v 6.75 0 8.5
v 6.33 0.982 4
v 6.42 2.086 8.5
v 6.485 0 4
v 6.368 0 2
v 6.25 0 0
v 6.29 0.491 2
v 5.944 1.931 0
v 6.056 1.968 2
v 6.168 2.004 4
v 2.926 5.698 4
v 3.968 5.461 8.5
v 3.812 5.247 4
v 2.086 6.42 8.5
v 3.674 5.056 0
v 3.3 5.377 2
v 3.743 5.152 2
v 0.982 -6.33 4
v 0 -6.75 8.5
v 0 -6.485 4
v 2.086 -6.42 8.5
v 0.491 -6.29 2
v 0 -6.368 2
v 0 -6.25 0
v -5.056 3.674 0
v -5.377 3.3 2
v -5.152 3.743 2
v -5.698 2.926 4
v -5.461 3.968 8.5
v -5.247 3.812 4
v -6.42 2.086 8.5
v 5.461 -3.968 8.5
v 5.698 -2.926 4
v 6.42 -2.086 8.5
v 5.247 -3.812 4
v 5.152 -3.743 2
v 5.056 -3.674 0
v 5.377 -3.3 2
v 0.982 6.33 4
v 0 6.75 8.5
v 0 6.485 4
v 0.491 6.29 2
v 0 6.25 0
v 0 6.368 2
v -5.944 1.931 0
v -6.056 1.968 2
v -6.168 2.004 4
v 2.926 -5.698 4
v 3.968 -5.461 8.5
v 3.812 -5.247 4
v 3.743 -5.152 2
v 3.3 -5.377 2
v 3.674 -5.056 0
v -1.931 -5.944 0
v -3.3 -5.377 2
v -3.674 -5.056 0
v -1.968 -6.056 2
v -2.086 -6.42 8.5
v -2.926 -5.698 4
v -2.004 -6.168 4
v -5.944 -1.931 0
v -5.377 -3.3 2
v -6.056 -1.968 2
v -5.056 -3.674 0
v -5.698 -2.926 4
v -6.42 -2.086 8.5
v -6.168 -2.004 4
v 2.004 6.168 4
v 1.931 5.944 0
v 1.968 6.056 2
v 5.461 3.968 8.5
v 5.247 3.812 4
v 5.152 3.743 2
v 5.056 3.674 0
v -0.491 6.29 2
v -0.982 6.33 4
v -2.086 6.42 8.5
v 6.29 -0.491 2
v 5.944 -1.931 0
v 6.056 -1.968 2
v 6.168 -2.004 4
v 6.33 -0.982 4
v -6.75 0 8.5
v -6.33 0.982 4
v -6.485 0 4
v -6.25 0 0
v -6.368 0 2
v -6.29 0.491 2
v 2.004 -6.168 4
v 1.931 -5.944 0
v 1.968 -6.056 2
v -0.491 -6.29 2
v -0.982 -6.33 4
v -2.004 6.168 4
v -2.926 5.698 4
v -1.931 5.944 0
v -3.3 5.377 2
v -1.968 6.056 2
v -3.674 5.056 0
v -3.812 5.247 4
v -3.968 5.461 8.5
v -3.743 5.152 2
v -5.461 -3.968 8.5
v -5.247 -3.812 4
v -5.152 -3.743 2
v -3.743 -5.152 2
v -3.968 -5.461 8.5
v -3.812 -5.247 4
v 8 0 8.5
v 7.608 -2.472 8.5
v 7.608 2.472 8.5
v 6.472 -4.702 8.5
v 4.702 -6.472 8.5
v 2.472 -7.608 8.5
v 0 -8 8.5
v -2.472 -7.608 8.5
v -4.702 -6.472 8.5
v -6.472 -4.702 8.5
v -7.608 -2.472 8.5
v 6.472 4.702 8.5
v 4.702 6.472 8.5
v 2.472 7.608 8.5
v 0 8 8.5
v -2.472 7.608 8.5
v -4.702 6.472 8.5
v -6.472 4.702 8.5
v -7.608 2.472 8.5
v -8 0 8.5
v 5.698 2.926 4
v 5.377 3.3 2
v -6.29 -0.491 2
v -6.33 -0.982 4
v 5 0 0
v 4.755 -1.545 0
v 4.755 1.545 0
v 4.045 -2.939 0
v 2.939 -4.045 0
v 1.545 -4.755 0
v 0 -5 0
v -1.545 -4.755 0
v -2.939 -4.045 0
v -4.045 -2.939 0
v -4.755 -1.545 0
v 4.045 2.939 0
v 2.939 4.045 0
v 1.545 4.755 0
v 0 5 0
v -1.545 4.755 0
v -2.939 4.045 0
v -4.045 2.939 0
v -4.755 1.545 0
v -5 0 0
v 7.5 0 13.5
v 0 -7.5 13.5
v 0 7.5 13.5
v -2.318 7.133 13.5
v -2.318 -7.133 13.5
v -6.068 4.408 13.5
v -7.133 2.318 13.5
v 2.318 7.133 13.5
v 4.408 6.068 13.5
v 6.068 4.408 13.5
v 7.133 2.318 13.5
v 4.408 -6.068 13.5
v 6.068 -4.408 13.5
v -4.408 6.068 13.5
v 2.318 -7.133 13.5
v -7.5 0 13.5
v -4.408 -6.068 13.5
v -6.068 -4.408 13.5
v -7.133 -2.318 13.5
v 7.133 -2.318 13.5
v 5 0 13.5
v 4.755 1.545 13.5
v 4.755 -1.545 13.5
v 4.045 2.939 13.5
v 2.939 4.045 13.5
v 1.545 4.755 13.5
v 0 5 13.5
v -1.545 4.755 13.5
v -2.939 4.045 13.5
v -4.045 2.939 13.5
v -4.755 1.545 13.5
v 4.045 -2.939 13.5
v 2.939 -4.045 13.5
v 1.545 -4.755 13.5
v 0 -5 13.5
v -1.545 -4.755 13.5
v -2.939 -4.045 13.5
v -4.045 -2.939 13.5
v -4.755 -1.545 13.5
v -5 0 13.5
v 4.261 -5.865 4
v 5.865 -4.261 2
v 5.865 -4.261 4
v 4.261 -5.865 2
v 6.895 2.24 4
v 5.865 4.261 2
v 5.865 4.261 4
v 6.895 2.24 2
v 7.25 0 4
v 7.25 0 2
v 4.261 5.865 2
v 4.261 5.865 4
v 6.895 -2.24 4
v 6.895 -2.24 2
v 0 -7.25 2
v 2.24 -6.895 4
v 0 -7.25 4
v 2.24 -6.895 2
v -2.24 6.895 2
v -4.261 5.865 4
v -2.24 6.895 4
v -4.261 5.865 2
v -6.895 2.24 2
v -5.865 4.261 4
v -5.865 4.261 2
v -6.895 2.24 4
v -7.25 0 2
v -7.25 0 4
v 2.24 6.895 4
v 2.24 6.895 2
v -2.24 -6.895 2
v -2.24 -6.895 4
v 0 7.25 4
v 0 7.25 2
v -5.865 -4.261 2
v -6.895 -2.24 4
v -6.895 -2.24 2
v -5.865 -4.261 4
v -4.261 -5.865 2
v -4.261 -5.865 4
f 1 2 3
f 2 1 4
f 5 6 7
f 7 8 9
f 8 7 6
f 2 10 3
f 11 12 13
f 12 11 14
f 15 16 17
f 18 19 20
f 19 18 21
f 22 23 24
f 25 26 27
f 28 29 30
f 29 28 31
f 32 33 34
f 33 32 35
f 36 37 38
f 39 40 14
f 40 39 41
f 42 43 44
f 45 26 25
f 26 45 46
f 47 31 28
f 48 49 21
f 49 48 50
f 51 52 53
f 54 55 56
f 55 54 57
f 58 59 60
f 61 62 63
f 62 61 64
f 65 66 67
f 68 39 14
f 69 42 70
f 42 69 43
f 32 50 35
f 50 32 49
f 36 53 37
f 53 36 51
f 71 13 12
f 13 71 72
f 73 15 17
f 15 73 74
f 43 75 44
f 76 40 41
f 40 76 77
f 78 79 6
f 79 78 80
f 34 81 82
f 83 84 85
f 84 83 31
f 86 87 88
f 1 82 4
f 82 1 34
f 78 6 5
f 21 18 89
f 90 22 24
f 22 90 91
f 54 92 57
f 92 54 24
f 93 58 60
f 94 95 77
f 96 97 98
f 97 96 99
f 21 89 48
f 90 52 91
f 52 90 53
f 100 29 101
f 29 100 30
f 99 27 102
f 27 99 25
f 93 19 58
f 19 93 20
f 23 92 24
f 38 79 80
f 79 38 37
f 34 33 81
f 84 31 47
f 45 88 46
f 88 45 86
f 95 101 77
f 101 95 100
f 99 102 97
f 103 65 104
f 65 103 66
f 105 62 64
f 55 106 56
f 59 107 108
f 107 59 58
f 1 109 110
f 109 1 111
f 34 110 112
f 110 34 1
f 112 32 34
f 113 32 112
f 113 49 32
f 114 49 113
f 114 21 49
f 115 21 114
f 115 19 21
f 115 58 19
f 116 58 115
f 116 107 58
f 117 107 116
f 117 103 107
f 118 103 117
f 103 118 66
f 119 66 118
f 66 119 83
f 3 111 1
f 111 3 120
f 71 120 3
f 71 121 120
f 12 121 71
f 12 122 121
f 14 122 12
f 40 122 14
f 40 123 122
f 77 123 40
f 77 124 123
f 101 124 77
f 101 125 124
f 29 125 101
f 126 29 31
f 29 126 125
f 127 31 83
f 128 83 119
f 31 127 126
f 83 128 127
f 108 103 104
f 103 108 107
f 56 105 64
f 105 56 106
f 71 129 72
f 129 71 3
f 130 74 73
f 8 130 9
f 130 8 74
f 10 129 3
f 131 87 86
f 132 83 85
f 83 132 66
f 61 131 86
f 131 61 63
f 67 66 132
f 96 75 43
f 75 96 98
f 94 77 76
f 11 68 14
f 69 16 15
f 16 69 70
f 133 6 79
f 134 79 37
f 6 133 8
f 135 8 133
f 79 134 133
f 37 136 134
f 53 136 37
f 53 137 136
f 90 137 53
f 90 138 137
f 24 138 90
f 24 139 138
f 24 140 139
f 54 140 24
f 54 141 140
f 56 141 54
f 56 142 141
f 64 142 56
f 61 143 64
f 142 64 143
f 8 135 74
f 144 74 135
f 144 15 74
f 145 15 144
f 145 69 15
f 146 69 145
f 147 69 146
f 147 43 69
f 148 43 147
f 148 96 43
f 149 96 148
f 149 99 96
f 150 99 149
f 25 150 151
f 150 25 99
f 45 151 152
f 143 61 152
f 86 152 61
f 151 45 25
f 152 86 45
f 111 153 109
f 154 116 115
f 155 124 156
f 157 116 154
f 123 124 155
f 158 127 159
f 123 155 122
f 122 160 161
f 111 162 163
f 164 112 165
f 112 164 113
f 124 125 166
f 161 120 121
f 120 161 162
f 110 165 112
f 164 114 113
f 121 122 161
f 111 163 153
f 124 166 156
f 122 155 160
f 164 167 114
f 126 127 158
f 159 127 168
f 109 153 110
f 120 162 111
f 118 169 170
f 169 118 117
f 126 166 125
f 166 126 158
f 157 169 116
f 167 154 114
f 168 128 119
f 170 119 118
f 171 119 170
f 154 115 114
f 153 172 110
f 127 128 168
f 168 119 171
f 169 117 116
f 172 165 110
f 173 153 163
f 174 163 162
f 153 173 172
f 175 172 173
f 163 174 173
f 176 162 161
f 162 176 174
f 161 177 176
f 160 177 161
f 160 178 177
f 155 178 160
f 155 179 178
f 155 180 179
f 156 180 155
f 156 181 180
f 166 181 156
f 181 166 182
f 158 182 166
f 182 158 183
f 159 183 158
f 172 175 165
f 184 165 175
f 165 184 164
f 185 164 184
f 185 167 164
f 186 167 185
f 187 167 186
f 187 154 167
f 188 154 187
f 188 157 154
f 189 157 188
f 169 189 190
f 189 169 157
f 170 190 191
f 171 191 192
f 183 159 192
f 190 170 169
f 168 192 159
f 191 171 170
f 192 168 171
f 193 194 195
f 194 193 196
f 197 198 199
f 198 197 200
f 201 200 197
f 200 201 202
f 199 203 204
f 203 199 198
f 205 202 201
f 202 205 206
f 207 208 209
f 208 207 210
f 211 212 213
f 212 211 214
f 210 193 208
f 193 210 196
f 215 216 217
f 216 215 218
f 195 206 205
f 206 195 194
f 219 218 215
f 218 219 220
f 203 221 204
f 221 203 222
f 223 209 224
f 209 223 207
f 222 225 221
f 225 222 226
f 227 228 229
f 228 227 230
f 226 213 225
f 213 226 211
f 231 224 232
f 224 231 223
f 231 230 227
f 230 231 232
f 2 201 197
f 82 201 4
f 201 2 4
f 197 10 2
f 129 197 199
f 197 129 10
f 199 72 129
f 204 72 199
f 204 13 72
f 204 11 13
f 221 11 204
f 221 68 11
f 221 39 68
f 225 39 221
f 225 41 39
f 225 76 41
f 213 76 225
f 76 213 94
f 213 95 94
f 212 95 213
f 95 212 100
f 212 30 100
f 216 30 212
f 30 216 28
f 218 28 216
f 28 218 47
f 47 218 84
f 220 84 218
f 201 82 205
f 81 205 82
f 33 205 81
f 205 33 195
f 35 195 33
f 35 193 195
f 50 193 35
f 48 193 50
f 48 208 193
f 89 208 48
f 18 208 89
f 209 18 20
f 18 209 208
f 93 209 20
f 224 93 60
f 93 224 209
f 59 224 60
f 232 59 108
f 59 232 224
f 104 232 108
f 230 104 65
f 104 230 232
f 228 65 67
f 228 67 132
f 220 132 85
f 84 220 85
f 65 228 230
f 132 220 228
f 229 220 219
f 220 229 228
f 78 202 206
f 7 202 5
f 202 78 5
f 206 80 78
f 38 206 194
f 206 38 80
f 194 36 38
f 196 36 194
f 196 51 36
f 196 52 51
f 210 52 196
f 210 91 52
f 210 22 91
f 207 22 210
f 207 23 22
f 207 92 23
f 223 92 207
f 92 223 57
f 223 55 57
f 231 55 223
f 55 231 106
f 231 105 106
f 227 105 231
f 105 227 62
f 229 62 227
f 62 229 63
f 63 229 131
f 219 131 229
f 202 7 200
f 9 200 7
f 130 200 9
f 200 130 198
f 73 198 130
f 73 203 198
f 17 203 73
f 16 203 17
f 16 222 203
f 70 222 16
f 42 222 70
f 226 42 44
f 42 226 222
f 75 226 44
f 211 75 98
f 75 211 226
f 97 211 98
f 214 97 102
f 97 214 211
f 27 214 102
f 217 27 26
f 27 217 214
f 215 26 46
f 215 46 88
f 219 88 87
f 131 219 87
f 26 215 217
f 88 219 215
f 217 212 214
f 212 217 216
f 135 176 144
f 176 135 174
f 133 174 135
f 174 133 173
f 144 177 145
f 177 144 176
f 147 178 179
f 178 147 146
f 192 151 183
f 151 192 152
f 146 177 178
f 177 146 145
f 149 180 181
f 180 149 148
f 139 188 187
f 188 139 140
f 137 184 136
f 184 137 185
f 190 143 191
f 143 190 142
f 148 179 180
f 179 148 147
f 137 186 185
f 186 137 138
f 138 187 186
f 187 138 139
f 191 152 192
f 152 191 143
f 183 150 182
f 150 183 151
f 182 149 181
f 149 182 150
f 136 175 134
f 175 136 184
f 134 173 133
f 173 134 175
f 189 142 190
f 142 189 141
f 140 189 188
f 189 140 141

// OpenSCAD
// openNSP_project, mounts section version 1.0
// Zexuan Qiao, 2024
// under GPL license ver3

mountLOA = 13.5; //.1
bore = 10; //.1
mainDiameter = 12.5; //.1
bellDiameter = 16; //.1
bell = 5; //.1
endOffset = 1; //.1
decoration = 2; //.1
decoPos = 2; //.1

decoDiameter = mainDiameter + 2;

/* [Utilities] */
// Segments, the higher the value, the smoother the surface would be.
$fn = 20;

difference(){
union(){
cylinder(h = mountLOA - bell, d1 = mainDiameter, d2 = mainDiameter + endOffset);
translate([0,0,mountLOA - bell]) cylinder(h = bell, d1 = bellDiameter, d2 = bellDiameter - endOffset);
translate([0,0,decoPos]) cylinder(h = decoration, d = decoDiameter);
}
cylinder(h = mountLOA, d = bore);
}
